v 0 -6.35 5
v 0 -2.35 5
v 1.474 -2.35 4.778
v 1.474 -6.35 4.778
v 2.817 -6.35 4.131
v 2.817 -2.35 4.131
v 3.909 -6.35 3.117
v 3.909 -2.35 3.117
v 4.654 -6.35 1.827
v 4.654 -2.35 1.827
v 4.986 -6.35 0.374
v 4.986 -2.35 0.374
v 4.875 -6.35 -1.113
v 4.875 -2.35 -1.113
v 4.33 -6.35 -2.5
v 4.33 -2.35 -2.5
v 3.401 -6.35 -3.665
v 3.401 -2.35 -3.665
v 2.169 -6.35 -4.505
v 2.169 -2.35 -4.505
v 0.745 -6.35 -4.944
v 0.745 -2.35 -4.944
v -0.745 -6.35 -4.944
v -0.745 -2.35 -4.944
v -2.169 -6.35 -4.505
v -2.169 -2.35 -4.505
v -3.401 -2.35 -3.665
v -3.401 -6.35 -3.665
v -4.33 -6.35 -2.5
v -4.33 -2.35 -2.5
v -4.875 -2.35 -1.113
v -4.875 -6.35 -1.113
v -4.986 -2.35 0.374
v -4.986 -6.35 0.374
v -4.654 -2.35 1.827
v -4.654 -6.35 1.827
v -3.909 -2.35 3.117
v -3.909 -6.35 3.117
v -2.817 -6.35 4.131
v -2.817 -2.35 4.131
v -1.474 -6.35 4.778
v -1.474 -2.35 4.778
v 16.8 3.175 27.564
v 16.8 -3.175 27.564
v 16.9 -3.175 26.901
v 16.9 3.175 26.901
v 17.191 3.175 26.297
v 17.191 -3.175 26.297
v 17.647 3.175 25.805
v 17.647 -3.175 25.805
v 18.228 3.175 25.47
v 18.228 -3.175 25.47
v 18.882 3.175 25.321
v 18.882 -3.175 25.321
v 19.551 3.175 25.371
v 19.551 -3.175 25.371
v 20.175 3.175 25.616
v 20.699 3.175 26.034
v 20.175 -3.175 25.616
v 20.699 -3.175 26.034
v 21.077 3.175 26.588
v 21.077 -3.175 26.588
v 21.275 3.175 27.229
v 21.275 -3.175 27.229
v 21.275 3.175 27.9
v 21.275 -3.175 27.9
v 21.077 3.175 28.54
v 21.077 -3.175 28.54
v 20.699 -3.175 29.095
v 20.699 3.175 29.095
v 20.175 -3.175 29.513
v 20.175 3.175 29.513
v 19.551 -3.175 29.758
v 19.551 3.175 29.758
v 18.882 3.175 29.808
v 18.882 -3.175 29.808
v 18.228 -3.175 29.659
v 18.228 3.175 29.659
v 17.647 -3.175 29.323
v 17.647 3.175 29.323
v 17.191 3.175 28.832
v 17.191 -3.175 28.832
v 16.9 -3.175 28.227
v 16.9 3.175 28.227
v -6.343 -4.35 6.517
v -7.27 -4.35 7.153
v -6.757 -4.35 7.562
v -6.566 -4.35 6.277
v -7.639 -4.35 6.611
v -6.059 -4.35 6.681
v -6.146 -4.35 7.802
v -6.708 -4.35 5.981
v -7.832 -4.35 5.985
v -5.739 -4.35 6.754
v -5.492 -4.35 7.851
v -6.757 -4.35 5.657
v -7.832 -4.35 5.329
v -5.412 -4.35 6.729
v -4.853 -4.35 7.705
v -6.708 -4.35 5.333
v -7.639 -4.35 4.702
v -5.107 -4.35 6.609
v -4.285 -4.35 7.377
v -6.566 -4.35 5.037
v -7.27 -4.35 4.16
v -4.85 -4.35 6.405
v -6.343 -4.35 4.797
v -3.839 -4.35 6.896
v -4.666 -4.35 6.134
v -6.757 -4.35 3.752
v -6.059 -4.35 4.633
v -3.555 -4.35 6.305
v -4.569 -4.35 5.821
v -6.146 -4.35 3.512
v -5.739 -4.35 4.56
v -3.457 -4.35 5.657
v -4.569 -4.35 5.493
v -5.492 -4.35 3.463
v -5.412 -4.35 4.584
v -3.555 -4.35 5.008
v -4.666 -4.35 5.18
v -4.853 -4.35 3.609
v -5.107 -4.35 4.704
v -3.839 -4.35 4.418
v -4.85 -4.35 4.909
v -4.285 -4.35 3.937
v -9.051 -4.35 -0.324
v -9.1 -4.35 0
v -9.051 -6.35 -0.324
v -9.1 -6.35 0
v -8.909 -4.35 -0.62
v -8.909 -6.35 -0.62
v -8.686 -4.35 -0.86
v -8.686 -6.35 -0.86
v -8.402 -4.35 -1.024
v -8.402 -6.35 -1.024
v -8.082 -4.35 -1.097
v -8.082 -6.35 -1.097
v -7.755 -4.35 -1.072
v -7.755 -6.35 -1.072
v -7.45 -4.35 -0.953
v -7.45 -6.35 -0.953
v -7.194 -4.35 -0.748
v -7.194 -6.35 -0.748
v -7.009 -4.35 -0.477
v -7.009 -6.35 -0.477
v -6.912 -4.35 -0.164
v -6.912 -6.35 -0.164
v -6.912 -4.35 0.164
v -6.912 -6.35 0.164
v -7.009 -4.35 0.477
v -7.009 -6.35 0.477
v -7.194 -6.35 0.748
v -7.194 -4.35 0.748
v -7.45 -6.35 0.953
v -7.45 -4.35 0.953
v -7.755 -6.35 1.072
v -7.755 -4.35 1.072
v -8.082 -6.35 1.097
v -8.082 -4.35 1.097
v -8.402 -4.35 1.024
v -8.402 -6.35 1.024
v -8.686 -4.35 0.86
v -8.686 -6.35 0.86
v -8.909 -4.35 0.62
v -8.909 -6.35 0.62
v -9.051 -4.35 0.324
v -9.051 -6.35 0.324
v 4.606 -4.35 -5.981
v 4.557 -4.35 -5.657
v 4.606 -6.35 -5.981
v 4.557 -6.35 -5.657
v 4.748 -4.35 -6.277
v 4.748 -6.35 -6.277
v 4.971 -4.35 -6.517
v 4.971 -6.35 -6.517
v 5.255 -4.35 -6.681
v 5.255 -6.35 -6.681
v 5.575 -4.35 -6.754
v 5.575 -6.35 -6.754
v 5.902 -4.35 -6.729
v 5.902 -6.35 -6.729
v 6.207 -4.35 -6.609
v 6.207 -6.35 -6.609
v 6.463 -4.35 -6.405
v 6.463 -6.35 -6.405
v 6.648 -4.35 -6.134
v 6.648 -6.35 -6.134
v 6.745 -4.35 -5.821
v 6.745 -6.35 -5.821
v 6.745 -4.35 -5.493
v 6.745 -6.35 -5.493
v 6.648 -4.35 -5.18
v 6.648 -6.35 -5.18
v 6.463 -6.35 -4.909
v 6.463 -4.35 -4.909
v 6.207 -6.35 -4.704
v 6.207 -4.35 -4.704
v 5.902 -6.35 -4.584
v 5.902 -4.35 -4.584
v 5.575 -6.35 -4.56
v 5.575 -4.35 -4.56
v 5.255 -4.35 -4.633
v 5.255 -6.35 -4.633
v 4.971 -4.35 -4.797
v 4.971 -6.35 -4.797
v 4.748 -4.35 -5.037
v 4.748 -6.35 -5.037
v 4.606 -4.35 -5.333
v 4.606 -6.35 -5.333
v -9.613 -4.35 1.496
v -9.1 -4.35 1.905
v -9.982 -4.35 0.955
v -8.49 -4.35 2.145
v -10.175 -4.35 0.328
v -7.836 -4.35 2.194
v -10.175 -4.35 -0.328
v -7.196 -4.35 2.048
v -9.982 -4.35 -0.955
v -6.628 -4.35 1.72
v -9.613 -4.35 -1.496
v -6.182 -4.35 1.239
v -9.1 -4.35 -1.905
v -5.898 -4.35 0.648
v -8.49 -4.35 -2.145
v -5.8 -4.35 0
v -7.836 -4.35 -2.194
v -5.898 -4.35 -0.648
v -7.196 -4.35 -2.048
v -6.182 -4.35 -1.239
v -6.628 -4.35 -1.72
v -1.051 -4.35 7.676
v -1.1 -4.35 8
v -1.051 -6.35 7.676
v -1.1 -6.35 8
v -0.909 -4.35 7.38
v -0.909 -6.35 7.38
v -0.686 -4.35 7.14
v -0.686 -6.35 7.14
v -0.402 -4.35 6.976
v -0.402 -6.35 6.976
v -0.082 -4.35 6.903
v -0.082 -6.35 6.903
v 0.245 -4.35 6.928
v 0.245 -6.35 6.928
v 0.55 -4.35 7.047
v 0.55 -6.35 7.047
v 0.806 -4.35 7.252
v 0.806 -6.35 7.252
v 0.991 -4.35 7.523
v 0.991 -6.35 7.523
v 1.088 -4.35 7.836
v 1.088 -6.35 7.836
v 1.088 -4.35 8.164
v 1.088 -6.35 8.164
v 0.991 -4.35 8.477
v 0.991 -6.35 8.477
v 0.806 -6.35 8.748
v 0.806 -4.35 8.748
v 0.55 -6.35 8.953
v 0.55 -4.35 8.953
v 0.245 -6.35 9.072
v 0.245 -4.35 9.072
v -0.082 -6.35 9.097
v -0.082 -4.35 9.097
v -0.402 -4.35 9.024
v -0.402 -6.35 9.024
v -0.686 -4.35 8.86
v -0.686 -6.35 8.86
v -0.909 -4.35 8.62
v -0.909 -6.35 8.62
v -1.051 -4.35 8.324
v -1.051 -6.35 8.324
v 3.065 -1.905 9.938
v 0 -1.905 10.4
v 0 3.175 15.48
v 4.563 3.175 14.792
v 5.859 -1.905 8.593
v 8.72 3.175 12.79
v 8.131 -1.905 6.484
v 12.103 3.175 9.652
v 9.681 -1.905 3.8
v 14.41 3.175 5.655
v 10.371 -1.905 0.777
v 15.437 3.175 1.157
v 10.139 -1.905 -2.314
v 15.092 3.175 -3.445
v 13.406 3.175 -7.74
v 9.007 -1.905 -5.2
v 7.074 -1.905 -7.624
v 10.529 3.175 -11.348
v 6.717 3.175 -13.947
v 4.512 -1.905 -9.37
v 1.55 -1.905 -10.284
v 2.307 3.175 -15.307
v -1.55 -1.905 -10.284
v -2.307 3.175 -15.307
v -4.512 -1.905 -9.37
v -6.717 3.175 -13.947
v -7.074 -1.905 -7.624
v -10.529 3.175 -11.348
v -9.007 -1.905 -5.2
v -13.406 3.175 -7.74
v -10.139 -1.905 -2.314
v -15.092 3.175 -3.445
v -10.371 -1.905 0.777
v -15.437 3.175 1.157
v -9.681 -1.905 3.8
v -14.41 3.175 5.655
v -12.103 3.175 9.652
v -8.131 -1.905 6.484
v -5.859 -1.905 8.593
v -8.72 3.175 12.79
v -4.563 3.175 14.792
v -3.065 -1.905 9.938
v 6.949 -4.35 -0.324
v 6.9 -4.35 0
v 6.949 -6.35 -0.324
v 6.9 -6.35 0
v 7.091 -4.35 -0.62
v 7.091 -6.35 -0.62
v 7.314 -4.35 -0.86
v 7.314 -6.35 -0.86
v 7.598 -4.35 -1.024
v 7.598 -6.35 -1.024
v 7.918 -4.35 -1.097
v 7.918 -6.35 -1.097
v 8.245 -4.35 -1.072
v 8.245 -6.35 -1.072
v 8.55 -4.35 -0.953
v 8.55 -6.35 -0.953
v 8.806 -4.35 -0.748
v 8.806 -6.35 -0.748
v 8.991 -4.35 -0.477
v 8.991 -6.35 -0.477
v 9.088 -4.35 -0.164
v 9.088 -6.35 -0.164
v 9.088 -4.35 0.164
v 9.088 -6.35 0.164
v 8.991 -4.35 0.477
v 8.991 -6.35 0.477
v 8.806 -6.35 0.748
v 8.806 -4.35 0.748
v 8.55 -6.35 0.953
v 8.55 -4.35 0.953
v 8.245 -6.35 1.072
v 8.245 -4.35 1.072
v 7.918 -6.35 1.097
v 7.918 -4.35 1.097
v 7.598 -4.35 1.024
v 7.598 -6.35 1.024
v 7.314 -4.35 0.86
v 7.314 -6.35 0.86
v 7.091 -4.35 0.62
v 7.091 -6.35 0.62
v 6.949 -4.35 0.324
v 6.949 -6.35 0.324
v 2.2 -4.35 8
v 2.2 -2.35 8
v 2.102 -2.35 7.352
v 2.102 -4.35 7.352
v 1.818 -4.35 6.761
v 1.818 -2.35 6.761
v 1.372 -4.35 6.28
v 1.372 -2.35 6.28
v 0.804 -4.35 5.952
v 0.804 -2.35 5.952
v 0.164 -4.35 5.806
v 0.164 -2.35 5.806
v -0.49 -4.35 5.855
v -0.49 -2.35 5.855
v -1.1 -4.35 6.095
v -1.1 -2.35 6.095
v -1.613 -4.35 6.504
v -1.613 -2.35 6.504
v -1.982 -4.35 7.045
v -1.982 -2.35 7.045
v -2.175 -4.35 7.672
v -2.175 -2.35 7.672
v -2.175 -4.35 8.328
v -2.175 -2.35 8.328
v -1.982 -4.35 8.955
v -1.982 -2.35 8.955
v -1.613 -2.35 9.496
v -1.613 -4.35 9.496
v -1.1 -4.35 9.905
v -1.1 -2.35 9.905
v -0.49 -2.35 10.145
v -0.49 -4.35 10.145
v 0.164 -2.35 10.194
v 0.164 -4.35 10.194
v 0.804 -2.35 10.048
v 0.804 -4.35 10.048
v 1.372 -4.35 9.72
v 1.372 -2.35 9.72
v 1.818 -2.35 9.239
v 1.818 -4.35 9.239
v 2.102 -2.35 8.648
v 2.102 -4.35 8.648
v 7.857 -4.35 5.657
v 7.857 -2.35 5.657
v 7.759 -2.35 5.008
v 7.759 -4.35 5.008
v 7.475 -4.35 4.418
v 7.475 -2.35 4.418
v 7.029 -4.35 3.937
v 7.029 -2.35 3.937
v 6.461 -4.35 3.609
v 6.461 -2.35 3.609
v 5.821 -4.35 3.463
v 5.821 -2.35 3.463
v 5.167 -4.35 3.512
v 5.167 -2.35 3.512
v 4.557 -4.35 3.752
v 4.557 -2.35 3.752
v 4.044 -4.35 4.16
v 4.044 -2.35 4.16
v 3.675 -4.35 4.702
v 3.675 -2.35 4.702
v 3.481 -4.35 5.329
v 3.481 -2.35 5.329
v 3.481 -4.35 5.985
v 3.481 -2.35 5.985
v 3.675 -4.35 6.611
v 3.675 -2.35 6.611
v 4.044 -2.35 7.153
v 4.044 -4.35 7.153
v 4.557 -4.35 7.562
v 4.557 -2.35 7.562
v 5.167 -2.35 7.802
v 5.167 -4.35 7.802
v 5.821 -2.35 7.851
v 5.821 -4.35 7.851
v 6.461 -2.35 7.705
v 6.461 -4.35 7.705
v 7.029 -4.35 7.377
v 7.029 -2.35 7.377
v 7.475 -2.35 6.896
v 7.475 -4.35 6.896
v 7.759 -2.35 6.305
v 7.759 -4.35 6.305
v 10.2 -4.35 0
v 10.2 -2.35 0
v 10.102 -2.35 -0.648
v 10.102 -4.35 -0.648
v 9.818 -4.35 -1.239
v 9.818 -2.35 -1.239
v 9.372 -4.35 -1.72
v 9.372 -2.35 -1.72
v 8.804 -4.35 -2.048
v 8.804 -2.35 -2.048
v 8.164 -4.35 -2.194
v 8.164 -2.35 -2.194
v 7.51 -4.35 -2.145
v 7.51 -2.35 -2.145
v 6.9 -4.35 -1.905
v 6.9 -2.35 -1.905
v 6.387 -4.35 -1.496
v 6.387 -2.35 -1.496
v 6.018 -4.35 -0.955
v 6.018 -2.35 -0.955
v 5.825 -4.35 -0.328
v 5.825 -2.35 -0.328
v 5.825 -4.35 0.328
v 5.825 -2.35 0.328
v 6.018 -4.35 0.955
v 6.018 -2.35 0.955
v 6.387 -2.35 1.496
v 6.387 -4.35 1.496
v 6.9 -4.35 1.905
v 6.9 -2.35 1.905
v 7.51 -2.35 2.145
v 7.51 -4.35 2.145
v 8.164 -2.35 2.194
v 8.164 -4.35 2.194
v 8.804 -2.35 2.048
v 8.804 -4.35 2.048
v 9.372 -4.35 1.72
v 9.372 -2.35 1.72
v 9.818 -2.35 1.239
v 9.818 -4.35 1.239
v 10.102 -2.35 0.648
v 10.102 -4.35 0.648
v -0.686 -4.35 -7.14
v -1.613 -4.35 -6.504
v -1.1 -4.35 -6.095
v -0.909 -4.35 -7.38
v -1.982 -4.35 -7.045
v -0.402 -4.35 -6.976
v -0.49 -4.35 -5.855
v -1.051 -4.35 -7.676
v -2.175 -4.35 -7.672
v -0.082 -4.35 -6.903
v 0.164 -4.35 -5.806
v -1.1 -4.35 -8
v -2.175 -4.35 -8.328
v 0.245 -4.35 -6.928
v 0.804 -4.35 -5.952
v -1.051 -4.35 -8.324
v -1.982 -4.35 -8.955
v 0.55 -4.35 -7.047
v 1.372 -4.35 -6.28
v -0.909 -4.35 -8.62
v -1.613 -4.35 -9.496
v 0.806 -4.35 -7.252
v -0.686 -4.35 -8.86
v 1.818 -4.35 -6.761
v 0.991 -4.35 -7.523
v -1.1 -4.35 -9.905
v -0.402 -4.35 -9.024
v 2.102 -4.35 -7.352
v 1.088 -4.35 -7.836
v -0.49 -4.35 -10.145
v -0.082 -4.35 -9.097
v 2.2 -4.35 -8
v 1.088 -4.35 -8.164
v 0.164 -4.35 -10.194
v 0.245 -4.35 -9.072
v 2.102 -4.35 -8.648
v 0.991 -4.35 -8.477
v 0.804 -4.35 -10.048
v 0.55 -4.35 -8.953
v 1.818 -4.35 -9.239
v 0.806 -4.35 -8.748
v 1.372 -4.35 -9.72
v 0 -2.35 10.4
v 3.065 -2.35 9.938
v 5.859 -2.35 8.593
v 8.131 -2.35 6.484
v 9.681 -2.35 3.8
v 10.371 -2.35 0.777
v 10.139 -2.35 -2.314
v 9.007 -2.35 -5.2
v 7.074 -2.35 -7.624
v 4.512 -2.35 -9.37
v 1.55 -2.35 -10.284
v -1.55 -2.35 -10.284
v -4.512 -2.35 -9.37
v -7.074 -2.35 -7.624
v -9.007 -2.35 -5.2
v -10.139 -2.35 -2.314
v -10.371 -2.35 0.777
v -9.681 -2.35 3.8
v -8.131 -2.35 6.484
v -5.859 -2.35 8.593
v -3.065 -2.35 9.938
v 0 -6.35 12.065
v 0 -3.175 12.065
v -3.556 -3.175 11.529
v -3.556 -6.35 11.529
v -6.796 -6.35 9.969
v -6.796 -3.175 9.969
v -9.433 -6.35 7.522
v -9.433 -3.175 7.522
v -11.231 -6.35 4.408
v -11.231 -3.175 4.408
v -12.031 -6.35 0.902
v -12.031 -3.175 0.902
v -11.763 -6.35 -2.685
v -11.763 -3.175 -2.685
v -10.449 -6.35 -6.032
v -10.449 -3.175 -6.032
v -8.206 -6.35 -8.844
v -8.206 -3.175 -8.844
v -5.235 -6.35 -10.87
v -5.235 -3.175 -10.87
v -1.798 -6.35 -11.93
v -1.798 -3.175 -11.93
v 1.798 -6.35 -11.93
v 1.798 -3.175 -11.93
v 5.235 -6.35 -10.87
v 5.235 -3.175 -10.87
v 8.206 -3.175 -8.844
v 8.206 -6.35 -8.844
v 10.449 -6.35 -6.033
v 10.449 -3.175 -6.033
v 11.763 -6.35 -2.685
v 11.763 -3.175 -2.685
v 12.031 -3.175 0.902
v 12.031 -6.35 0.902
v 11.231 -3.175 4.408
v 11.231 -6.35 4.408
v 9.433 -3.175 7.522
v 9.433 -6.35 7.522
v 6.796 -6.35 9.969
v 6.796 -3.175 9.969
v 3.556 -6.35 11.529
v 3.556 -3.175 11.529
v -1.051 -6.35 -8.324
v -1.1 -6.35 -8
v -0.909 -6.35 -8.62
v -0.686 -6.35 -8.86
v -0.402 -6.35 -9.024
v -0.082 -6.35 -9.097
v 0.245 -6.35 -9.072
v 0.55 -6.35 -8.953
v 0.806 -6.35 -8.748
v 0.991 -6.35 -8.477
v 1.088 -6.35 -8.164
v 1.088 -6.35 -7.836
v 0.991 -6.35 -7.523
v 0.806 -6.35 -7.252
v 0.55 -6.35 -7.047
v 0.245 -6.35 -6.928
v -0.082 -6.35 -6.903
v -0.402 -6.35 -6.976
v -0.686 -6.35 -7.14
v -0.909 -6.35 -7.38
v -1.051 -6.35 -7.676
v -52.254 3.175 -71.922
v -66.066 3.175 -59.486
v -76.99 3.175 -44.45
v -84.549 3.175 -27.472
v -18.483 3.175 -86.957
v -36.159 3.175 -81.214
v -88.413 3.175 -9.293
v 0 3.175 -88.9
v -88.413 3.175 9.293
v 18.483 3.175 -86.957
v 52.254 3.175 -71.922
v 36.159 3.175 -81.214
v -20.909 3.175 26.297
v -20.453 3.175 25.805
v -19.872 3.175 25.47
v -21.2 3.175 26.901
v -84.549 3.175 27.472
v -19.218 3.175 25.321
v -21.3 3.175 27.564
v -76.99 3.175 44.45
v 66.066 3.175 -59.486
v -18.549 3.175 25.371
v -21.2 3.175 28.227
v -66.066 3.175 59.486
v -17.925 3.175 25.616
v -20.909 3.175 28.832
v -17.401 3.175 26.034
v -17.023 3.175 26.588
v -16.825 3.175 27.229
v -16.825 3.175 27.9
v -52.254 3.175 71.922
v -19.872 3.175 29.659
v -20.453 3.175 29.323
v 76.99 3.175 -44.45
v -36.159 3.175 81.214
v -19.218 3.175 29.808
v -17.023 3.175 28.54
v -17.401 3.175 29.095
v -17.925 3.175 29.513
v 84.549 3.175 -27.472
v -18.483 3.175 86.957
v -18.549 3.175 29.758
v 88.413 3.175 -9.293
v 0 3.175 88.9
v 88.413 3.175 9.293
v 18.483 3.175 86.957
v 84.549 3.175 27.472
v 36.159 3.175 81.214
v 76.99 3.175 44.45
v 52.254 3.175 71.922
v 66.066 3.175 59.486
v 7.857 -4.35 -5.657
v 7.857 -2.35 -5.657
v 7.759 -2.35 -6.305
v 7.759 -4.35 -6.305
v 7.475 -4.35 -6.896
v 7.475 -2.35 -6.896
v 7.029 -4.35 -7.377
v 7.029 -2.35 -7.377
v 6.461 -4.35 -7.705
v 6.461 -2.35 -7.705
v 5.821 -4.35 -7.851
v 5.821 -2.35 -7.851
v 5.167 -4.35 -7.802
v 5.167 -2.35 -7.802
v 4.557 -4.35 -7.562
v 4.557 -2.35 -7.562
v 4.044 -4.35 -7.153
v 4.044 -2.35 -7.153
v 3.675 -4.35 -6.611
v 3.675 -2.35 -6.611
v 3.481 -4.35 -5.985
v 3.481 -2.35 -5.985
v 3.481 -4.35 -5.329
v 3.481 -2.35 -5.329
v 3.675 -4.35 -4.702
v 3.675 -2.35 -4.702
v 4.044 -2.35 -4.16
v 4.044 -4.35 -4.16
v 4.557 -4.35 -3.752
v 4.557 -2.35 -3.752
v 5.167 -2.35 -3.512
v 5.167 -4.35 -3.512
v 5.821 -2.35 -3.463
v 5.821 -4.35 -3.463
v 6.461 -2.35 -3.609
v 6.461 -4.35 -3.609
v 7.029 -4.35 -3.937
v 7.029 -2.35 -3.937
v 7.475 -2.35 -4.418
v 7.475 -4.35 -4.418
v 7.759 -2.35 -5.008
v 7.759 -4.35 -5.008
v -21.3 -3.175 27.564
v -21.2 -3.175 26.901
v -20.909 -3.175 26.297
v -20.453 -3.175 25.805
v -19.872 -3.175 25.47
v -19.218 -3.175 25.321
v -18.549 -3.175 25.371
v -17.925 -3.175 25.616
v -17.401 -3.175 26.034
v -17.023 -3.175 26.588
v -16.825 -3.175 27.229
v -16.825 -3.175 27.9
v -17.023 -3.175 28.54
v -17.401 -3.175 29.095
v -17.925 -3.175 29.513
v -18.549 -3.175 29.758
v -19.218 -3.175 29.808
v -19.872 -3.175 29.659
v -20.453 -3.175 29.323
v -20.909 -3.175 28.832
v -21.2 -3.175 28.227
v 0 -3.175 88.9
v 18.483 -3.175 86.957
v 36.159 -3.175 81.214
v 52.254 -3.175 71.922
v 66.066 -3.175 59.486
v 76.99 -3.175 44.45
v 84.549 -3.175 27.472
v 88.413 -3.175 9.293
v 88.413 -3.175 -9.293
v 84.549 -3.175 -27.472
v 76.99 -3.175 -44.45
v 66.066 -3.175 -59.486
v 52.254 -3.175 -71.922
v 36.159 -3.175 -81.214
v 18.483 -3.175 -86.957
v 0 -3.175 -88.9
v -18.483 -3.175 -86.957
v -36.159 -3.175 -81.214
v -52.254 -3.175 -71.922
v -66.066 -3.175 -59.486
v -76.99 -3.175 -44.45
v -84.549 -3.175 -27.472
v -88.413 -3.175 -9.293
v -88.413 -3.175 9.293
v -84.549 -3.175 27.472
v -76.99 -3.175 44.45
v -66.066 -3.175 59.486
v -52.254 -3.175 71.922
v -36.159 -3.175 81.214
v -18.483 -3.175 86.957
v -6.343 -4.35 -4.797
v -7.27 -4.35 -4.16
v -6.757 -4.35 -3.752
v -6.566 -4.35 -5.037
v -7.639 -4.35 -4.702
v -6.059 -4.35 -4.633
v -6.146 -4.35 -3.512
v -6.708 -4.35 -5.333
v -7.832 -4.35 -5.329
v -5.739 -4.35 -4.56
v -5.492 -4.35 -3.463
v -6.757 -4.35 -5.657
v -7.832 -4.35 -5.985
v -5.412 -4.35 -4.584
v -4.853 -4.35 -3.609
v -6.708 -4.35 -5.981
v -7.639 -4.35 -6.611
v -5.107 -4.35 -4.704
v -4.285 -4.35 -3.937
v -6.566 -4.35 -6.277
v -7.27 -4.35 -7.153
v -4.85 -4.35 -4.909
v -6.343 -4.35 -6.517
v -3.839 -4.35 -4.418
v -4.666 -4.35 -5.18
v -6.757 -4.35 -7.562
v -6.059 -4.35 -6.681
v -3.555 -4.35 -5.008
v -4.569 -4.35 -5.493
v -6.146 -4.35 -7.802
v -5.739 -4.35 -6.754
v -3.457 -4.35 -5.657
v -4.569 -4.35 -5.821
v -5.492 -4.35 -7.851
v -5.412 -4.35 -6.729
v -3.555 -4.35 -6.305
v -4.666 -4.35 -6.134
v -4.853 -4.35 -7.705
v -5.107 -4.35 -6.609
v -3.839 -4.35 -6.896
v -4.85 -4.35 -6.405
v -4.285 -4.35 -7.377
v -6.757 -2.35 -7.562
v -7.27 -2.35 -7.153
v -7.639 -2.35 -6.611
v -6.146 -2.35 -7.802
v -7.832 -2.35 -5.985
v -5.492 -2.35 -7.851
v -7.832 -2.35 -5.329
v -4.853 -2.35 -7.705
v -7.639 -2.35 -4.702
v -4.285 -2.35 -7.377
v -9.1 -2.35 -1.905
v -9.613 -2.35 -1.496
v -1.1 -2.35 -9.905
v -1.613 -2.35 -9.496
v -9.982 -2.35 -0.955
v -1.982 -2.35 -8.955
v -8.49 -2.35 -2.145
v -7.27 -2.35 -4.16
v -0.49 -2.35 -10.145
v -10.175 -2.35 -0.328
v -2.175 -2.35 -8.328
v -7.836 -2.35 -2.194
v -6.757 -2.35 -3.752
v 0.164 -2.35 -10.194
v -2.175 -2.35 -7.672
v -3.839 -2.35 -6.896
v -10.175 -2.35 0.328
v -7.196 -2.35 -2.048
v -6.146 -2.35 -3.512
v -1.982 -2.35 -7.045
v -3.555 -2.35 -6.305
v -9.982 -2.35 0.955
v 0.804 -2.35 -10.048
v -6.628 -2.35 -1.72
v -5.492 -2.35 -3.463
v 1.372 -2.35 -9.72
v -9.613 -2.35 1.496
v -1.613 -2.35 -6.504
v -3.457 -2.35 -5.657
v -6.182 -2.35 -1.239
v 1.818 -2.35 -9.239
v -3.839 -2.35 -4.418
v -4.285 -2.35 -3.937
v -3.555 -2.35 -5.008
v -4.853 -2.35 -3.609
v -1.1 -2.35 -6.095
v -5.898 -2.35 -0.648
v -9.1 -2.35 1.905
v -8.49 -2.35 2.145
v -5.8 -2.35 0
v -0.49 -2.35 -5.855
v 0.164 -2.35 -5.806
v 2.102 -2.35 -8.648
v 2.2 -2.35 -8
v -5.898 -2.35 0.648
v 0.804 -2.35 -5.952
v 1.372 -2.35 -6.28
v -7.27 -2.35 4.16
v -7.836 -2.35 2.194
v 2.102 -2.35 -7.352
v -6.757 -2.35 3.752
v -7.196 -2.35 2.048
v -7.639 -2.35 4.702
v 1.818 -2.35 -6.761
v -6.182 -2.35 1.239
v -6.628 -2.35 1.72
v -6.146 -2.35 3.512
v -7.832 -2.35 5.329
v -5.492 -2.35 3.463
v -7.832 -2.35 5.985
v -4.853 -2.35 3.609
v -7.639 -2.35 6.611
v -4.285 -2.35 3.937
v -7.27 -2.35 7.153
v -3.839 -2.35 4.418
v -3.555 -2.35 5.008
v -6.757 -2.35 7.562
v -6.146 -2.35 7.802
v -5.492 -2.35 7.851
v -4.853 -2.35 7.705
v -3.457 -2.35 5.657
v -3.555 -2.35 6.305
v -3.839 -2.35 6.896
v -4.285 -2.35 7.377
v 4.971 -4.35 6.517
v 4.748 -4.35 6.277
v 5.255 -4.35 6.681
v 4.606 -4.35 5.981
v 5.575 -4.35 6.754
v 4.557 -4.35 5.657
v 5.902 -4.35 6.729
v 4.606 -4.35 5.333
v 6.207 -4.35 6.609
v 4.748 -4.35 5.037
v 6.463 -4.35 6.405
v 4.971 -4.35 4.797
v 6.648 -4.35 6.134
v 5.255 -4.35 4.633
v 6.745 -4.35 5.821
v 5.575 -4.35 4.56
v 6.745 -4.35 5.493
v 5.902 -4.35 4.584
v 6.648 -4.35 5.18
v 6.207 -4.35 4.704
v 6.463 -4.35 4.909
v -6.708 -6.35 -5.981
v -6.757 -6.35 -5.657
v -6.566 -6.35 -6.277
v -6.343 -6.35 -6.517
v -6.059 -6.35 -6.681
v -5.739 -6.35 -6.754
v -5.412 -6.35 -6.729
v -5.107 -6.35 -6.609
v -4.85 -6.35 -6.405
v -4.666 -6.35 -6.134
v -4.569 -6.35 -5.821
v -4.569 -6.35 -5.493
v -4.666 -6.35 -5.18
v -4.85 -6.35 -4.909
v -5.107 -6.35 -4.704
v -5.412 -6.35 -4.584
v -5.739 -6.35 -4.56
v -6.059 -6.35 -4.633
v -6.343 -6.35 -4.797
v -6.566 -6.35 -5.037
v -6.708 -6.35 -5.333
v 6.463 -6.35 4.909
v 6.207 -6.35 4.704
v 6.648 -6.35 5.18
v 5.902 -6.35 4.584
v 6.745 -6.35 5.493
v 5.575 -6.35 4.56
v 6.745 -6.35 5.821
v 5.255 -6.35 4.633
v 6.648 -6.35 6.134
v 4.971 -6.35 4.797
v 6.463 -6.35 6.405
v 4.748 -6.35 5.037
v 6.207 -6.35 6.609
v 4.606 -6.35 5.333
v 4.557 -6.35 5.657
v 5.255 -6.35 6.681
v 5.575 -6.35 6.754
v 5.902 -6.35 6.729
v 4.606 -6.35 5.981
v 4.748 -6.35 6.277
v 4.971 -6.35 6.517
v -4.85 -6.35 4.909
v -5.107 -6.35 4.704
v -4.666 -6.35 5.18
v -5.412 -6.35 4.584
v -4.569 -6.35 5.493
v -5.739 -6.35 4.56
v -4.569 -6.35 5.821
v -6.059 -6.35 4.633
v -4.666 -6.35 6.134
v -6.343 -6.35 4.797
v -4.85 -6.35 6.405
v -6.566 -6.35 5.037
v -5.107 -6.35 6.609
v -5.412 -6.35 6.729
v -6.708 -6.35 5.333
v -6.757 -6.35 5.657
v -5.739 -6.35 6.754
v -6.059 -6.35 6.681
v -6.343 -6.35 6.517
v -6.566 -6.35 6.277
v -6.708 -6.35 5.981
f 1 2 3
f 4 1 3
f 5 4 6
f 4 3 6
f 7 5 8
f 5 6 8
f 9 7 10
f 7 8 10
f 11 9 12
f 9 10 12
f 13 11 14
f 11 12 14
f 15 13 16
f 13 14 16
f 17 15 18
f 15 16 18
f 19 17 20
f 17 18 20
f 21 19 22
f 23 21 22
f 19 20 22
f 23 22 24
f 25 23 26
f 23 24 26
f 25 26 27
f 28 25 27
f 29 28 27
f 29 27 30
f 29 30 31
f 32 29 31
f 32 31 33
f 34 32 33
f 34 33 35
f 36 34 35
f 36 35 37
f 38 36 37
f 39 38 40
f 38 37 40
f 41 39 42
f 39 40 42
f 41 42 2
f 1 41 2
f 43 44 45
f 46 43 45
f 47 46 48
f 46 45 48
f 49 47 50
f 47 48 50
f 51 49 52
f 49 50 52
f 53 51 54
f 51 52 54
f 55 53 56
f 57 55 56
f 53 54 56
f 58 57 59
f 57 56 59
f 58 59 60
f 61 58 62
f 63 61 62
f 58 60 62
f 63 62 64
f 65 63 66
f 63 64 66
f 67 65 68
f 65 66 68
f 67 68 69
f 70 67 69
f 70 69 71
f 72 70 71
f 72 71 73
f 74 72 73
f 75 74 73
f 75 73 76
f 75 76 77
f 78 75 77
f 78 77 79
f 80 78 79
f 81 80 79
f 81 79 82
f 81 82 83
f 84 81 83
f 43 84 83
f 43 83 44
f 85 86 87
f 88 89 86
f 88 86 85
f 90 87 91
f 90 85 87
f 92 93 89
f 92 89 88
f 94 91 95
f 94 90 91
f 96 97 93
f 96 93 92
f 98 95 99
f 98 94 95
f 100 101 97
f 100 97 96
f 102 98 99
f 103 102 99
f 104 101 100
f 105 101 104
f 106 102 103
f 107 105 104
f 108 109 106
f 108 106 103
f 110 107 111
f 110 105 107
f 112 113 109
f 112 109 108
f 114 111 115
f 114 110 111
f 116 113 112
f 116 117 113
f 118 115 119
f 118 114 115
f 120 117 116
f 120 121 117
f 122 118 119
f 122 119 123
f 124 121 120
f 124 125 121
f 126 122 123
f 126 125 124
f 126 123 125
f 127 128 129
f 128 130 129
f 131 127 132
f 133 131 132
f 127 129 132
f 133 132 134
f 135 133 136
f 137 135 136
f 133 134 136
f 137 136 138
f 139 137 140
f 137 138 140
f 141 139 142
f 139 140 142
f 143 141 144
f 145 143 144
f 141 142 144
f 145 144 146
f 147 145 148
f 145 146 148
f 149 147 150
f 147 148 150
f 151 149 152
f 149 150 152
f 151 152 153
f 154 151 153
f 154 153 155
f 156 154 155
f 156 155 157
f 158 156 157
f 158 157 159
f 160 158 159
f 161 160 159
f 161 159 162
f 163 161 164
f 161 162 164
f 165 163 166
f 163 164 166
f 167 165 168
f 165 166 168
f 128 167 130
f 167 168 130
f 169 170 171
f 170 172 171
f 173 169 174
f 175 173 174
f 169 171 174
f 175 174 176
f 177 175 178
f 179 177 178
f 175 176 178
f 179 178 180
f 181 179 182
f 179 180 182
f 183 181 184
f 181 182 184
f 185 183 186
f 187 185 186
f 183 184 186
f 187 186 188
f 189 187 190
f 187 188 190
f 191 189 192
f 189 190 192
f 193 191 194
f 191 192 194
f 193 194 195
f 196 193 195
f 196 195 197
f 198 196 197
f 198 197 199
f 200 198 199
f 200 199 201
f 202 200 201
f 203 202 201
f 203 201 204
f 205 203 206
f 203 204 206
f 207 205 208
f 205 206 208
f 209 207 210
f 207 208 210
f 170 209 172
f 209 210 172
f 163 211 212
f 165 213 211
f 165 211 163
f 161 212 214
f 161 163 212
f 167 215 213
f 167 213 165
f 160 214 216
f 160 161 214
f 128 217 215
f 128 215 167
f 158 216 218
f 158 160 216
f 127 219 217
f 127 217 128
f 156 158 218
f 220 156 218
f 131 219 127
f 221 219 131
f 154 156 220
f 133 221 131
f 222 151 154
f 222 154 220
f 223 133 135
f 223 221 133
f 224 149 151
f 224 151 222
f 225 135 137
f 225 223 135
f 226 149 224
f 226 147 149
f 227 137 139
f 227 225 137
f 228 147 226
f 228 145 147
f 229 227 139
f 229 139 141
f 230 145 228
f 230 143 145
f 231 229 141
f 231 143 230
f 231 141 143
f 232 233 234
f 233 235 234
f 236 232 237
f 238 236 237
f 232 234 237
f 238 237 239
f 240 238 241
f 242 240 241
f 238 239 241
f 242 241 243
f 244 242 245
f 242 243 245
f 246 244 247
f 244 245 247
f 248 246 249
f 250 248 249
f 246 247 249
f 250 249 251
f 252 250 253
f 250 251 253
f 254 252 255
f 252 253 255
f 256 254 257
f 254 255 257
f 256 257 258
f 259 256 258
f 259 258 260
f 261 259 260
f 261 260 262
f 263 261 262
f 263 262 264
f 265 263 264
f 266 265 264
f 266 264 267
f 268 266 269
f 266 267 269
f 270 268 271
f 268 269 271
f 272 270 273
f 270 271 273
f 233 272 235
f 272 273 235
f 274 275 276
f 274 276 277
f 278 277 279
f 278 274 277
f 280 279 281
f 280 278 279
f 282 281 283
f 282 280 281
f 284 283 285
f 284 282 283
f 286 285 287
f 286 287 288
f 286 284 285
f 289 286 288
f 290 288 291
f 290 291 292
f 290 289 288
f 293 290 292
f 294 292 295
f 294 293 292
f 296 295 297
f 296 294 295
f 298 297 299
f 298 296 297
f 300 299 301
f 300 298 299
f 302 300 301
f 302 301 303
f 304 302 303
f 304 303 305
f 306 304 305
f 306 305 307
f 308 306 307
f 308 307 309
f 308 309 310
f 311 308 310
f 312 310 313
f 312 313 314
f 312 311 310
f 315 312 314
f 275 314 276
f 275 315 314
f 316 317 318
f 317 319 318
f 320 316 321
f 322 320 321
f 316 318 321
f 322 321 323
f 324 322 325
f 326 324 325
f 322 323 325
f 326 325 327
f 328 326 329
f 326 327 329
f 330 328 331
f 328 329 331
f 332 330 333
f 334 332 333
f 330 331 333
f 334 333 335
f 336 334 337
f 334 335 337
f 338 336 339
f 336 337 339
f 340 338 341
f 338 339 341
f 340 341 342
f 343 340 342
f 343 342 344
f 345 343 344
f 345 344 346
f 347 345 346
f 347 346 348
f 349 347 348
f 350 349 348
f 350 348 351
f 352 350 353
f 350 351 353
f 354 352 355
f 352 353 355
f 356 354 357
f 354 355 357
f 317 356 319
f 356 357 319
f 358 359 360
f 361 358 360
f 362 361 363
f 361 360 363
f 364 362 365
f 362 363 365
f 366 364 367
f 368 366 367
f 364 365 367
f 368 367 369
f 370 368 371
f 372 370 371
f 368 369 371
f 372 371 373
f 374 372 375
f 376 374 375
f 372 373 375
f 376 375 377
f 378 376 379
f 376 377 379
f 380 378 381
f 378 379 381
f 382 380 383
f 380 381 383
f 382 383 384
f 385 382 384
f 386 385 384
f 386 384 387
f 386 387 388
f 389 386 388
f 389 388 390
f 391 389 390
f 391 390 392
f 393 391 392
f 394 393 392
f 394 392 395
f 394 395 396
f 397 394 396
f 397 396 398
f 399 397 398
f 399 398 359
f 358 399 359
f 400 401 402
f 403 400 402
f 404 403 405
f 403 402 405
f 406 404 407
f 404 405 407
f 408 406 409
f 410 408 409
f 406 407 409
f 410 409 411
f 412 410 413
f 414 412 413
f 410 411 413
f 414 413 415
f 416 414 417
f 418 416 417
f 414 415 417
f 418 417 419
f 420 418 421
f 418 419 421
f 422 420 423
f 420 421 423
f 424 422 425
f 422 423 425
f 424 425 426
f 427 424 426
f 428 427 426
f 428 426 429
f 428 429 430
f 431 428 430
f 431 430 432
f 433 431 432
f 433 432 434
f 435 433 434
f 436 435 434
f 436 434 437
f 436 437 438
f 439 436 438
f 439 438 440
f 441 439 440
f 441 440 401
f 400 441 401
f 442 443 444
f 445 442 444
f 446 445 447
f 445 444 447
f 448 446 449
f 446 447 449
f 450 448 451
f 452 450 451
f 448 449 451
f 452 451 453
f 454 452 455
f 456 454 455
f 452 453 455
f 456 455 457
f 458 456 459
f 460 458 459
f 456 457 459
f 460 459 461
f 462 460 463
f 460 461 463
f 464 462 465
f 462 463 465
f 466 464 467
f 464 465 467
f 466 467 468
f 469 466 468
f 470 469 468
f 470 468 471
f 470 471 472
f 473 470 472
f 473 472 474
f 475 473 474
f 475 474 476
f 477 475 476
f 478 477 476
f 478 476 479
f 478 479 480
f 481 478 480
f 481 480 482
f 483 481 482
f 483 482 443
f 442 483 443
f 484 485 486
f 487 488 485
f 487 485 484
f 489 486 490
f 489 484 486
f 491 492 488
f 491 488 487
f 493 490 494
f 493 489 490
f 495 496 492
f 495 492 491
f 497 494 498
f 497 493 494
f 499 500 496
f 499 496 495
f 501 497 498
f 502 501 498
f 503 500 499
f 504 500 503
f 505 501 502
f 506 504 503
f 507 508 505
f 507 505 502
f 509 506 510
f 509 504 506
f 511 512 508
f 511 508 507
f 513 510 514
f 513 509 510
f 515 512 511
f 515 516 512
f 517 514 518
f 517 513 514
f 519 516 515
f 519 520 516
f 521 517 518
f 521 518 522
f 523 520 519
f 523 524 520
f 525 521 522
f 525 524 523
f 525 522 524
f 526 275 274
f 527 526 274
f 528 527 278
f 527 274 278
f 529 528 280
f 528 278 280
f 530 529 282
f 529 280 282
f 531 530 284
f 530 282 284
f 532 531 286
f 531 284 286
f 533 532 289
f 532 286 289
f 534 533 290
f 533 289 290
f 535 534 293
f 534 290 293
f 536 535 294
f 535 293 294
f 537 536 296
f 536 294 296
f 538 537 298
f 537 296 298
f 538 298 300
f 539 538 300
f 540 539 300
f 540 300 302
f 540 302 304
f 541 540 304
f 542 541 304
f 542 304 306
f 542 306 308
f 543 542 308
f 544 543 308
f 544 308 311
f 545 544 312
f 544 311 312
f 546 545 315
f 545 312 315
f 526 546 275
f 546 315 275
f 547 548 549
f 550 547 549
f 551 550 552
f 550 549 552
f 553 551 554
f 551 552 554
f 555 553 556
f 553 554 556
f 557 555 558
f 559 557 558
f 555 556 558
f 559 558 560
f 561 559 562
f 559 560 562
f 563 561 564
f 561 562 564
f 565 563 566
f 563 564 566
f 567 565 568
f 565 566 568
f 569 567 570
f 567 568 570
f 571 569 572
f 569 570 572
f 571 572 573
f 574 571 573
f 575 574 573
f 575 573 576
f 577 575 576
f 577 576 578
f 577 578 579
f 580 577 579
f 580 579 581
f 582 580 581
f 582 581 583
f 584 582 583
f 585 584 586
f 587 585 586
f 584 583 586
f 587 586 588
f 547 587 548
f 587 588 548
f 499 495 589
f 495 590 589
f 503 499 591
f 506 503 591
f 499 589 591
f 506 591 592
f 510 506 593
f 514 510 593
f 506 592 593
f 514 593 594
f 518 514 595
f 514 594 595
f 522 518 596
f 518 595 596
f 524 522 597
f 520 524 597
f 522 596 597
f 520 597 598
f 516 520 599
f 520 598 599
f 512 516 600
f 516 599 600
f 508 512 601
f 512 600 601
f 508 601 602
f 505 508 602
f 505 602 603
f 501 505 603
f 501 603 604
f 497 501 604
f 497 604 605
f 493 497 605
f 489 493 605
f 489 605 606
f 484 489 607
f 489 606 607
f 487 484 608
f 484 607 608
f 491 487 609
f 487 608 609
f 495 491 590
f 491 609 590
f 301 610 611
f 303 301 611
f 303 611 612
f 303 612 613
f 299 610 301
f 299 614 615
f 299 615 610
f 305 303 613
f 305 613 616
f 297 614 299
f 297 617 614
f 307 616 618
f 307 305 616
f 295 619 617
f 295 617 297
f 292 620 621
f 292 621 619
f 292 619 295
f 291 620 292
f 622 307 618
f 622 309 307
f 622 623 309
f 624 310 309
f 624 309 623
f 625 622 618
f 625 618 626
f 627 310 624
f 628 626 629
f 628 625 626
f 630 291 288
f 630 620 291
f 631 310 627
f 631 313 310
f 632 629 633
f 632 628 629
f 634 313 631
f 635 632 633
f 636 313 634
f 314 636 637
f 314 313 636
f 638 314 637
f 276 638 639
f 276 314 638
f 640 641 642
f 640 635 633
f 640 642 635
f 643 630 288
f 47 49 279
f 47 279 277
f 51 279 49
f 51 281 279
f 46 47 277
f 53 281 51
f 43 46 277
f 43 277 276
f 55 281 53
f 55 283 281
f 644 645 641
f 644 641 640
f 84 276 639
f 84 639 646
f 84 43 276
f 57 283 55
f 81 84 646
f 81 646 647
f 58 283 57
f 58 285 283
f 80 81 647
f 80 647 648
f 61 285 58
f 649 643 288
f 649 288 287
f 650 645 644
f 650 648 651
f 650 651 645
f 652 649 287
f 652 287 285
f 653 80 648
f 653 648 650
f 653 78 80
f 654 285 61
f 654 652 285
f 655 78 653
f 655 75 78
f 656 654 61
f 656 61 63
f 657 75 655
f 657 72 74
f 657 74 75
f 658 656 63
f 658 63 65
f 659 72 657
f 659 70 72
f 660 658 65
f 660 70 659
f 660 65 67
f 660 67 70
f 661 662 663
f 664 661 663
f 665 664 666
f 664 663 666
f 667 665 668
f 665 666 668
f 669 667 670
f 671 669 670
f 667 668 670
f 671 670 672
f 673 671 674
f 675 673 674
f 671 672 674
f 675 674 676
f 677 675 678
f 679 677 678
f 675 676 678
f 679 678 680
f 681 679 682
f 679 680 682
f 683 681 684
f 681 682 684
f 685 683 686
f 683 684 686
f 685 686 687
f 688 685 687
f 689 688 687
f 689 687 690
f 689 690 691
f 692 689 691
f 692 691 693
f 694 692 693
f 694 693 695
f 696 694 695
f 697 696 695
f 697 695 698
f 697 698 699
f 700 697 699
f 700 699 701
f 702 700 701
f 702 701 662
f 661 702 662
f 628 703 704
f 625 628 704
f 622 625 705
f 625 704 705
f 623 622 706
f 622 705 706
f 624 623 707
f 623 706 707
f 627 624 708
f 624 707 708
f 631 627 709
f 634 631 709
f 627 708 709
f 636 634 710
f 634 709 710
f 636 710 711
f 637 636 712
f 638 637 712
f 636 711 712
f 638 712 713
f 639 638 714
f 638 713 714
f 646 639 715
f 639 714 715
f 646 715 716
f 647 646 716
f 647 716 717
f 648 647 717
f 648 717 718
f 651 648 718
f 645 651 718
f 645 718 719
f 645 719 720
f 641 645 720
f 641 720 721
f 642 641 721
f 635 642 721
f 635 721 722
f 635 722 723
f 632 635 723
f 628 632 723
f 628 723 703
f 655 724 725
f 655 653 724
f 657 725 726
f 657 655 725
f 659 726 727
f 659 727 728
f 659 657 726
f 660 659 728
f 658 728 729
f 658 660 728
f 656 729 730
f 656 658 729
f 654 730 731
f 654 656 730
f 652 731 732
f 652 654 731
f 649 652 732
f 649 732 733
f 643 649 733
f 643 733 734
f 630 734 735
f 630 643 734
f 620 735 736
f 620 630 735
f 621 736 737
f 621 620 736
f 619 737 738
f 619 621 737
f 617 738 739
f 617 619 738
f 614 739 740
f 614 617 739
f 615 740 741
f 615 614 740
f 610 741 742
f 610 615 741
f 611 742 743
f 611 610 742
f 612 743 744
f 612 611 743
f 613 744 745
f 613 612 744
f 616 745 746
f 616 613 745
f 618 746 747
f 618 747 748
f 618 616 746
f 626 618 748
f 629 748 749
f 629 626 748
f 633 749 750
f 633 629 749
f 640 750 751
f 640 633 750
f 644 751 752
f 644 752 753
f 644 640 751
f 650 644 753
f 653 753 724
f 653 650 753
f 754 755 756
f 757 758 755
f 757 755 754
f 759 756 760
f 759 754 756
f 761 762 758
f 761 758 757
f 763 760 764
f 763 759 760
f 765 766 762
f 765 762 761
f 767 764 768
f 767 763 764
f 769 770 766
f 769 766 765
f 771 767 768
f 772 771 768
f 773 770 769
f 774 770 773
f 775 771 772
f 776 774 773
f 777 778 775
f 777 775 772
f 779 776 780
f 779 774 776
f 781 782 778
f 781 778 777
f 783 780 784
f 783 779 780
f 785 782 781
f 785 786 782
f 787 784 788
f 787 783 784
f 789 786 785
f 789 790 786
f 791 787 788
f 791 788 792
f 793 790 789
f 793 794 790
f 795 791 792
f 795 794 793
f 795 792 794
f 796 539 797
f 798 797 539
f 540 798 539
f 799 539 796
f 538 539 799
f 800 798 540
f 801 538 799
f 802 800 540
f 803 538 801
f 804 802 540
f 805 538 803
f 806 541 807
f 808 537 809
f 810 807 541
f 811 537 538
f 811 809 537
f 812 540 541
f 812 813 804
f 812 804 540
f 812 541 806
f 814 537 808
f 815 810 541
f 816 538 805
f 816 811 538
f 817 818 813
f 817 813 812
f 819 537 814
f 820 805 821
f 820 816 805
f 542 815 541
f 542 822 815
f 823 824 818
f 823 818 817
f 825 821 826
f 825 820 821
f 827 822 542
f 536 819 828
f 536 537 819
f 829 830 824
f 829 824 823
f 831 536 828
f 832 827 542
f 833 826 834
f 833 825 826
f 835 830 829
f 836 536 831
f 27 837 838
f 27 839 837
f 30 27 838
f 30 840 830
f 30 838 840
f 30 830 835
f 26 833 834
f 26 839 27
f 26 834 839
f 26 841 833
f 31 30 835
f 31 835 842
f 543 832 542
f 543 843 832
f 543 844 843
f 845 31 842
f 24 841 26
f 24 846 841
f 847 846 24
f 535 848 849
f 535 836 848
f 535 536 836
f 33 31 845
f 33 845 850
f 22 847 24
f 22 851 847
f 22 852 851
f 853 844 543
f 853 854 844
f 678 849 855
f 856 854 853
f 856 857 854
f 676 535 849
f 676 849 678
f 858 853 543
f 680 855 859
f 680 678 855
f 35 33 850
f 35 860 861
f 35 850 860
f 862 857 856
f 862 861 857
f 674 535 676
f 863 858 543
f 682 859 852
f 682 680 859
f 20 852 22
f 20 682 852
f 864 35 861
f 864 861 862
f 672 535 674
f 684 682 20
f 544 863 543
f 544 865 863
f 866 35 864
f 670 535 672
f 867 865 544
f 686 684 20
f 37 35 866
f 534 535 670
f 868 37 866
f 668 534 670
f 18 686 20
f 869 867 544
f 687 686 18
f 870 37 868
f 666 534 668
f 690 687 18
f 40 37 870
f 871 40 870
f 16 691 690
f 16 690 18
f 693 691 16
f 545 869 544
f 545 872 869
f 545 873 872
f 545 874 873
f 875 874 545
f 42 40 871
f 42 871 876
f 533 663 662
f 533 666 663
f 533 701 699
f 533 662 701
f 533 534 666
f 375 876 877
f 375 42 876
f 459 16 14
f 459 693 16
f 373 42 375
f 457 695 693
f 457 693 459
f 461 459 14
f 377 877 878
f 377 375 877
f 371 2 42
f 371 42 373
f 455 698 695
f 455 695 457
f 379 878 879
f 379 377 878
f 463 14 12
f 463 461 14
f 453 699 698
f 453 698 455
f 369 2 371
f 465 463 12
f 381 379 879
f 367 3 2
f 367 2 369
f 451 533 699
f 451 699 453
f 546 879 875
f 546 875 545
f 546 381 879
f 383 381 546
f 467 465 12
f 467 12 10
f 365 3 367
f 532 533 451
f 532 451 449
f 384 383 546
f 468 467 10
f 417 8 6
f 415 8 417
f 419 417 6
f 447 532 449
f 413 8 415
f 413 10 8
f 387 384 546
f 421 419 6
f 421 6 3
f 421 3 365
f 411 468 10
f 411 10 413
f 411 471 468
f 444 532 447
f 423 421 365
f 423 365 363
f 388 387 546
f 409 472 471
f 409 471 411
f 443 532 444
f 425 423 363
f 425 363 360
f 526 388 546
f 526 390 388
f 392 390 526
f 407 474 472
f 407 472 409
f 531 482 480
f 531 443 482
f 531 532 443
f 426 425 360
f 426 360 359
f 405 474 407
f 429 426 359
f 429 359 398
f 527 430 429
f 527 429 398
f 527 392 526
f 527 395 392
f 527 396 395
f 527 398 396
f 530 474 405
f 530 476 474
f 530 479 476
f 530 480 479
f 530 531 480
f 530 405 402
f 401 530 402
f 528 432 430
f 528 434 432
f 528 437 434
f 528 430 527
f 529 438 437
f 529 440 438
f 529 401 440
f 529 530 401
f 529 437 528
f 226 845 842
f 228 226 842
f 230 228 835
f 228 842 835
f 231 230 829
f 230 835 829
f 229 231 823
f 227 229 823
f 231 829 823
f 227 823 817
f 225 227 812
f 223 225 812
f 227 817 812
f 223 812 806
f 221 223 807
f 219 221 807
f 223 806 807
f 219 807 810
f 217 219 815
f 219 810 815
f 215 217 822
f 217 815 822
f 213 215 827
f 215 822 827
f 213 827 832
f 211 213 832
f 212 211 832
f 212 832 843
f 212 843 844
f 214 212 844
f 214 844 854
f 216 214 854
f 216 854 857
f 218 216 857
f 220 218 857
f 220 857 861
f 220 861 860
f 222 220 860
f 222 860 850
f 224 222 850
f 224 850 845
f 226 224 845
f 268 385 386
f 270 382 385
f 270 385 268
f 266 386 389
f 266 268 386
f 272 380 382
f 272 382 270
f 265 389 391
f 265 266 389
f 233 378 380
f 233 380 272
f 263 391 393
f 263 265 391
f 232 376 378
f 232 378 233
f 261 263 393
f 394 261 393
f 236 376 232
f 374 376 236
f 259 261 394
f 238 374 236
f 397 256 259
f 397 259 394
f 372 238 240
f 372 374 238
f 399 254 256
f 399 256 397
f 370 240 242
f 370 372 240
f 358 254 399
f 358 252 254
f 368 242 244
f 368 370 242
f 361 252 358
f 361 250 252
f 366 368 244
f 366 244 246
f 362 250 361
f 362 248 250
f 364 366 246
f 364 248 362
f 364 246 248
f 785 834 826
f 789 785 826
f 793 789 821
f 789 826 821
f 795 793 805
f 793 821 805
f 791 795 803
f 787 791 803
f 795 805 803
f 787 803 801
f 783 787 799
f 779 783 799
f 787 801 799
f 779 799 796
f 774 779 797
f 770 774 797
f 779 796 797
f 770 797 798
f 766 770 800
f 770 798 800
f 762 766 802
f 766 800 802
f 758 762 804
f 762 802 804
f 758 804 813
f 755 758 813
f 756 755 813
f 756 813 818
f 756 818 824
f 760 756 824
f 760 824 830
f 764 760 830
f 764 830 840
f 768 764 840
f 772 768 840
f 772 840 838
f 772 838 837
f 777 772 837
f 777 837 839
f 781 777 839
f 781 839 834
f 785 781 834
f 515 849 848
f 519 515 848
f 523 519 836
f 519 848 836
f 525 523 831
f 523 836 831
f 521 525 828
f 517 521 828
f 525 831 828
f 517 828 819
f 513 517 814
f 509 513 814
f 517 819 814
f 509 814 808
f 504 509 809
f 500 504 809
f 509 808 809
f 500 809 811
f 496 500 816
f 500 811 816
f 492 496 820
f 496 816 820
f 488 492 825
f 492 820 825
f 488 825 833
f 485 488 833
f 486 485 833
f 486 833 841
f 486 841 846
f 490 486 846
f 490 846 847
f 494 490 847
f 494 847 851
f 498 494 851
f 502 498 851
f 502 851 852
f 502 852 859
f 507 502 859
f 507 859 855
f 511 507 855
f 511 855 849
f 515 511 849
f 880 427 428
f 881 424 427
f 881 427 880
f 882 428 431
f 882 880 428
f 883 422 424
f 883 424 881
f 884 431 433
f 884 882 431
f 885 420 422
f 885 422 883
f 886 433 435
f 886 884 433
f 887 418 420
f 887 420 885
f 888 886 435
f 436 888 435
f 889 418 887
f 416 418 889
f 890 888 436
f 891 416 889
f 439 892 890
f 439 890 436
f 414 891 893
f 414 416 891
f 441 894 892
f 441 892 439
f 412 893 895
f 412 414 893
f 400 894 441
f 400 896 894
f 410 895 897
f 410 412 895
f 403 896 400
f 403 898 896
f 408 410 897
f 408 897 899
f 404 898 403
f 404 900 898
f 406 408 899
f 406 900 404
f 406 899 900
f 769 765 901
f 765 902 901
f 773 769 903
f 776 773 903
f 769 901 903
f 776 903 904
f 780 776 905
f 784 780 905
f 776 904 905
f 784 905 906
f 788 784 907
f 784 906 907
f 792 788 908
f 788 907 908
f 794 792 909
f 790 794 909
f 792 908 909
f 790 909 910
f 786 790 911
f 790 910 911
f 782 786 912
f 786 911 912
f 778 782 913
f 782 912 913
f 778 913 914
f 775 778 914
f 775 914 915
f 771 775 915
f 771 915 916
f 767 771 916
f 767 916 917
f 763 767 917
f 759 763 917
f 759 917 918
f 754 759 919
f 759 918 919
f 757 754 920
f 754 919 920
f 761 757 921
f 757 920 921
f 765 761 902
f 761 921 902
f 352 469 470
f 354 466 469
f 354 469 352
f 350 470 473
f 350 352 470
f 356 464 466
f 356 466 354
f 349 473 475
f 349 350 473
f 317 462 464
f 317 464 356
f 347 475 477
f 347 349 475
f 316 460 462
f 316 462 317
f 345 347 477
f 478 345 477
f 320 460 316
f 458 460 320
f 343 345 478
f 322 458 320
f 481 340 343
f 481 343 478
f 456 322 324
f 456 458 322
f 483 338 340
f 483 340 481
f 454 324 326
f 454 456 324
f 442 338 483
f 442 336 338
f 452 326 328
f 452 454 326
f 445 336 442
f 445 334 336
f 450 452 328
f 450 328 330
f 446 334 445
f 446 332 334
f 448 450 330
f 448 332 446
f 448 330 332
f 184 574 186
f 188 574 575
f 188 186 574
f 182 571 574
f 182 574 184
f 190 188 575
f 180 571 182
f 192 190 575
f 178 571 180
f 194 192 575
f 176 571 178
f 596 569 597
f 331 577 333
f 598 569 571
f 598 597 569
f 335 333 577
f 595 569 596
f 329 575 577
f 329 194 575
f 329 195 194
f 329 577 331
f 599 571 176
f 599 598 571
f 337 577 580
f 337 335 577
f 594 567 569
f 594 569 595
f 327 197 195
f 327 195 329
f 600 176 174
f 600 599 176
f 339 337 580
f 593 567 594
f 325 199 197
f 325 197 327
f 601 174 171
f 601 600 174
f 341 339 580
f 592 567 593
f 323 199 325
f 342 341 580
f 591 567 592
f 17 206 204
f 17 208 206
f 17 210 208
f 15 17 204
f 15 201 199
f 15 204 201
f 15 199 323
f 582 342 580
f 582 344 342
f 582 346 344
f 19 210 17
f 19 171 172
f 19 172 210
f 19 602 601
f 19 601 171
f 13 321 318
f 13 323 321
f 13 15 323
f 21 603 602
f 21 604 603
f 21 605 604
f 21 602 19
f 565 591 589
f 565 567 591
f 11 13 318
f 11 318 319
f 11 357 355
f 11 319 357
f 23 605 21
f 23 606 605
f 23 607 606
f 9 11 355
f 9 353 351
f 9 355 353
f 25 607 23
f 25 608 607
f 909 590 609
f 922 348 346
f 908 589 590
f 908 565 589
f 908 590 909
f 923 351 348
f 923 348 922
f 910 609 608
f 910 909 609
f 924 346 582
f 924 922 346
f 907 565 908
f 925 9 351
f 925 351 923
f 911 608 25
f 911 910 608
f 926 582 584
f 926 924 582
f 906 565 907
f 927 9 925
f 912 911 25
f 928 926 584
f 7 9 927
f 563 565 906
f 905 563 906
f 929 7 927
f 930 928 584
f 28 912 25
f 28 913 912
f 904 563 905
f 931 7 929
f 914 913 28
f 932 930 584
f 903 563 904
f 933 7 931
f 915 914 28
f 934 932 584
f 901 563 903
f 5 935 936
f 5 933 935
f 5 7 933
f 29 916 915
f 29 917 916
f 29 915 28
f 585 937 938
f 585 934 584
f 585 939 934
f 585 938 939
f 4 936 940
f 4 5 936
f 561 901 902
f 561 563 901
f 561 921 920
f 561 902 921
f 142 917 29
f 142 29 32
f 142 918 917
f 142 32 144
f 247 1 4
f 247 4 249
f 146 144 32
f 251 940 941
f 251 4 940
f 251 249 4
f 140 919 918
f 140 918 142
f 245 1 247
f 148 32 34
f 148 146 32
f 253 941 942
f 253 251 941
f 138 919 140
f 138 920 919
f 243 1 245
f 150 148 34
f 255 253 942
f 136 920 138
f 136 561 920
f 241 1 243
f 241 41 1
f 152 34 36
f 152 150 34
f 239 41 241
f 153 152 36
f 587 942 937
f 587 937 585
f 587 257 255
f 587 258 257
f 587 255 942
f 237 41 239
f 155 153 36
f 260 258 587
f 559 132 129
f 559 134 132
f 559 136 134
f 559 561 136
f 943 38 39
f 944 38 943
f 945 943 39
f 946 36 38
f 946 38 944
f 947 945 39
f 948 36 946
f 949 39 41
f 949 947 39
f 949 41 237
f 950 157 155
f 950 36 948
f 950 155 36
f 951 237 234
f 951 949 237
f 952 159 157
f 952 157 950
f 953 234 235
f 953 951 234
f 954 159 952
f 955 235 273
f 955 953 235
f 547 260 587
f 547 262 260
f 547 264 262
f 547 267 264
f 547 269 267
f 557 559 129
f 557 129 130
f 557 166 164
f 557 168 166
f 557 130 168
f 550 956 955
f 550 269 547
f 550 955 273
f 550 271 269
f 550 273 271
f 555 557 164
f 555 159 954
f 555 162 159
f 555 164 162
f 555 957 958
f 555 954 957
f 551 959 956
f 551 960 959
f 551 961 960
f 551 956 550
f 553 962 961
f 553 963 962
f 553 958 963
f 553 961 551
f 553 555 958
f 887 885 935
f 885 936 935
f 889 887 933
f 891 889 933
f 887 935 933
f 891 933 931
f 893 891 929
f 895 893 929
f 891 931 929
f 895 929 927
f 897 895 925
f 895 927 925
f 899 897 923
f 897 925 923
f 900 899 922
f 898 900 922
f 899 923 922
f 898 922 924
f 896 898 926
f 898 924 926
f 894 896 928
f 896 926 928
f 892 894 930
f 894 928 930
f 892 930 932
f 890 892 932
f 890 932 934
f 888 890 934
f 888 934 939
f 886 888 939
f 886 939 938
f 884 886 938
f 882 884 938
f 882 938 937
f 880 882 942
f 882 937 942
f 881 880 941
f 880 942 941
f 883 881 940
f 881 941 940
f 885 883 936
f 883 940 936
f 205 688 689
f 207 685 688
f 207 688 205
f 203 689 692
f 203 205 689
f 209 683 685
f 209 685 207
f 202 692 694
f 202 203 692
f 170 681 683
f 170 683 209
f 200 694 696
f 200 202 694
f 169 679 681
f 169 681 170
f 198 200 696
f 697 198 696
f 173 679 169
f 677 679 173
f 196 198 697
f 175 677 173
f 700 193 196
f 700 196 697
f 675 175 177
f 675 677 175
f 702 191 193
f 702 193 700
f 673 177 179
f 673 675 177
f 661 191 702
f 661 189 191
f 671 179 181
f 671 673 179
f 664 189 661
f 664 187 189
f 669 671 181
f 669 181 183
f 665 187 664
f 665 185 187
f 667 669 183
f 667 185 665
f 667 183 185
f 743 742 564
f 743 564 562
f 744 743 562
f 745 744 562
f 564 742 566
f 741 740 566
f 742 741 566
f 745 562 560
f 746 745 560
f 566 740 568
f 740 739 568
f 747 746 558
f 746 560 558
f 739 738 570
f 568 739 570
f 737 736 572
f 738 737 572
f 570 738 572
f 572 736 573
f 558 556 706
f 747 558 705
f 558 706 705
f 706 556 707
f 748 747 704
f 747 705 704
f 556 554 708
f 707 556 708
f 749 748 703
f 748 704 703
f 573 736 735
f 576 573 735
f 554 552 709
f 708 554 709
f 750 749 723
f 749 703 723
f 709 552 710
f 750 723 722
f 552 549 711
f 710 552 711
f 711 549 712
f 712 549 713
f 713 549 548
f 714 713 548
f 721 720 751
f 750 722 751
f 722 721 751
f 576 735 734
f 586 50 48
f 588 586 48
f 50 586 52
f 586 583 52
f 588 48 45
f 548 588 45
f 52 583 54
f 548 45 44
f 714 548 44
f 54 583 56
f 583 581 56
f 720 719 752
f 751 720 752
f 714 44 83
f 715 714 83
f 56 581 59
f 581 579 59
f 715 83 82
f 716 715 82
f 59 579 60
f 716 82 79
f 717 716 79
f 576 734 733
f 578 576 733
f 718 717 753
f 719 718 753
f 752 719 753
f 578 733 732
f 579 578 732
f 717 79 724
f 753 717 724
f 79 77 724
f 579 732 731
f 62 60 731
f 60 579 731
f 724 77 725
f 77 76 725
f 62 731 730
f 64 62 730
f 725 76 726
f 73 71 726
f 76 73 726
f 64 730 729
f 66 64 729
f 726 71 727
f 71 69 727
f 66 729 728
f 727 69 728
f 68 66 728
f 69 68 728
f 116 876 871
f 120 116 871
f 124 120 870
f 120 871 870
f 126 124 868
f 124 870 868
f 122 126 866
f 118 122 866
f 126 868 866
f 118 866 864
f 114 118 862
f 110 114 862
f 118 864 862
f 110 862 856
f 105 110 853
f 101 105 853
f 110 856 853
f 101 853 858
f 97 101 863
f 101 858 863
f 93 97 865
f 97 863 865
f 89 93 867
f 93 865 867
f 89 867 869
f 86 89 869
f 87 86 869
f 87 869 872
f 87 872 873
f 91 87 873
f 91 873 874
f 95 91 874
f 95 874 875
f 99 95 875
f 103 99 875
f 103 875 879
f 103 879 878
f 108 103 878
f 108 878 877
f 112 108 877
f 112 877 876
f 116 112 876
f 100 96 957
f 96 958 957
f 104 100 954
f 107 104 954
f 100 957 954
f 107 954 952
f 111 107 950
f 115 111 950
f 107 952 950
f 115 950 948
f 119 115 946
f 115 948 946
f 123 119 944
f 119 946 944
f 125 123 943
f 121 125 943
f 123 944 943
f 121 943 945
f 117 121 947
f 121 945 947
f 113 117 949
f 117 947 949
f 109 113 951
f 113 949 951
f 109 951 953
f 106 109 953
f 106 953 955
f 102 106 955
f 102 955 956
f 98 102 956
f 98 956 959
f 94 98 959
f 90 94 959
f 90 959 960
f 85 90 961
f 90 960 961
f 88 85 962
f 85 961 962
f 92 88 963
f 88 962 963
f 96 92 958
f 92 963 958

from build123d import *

# Parameters (mm, degrees)
SKETCH1_R                      = 88.9
BOSS_EXTRUDE1_DEPTH            = 3.175
SKETCH2_R                      = 12.065
BOSS_EXTRUDE2_DEPTH            = 3.175
SKETCH5_R                      = 10.4
CUT_EXTRUDE1_DEPTH             = 5.525
SKETCH6_R                      = 5
CUT_EXTRUDE2_DEPTH             = 4
CBORE_FOR_M2_SHCS1_D           = 2.2
CBORE_FOR_M2_SHCS1_DEPTH       = 6
CBORE_FOR_M2_SHCS1_CBORE_D     = 4.4
CBORE_FOR_M2_SHCS1_CBORE_DEPTH = 2
CBORE_FOR_M2_SHCS1_TIP         = 0.660946681
M4_CLEARANCE_HOLE1_D           = 4.5
CHAMFER1_SIZE                  = 5.08


with BuildPart() as part:
    # Sketch1 → Boss-Extrude1 (new, symmetric)
    with BuildSketch(Plane(origin=(0, 0, 0), x_dir=(1, 0, 0), z_dir=(0, 1, 0))):
        with Locations(Location((0, 0, 0), (0, 0, 270))):
            Circle(SKETCH1_R)
    extrude(amount=BOSS_EXTRUDE1_DEPTH, both=True)

    # Sketch2 → Boss-Extrude2 (add)
    with BuildSketch(Plane.XZ.offset(3.175)):
        with Locations(Location((0, 0, 0), (0, 0, 90))):
            Circle(SKETCH2_R)
    extrude(amount=BOSS_EXTRUDE2_DEPTH)

    # Sketch5 → Cut-Extrude1 (cut)
    with BuildSketch(Plane(origin=(0, 3.175, 0), x_dir=(1, 0, 0), z_dir=(0, 1, 0))):
        with Locations(Location((0, 0, 0), (0, 0, 270))):
            Circle(SKETCH5_R)
    extrude(amount=-CUT_EXTRUDE1_DEPTH, mode=Mode.SUBTRACT)

    # Sketch6 → Cut-Extrude2 (cut)
    with BuildSketch(Plane(origin=(0, -2.35, 0), x_dir=(1, 0, 0), z_dir=(0, 1, 0))):
        with Locations(Location((0, 0, 0), (0, 0, 270))):
            Circle(SKETCH6_R)
    extrude(amount=-CUT_EXTRUDE2_DEPTH, mode=Mode.SUBTRACT)

    # CBORE for M2 SHCS1
    with Locations(Plane(origin=(0, -2.35, 0), x_dir=(1, 0, 0), z_dir=(0, 1, 0))):
        with Locations((-5.65685425, 5.65685425), (0, 8), (5.65685425, 5.65685425), (8, 0), (5.65685425, -5.65685425), (0, -8), (-5.65685425, -5.65685425), (-8, 0)):
            CounterBoreHole(CBORE_FOR_M2_SHCS1_D / 2, CBORE_FOR_M2_SHCS1_CBORE_D / 2, CBORE_FOR_M2_SHCS1_CBORE_DEPTH, depth=CBORE_FOR_M2_SHCS1_DEPTH)
            with Locations((0, 0, -(CBORE_FOR_M2_SHCS1_DEPTH + CBORE_FOR_M2_SHCS1_TIP / 2))):  # 118° drill point
                Cone(0, CBORE_FOR_M2_SHCS1_D / 2, CBORE_FOR_M2_SHCS1_TIP, mode=Mode.SUBTRACT)

    # M4 Clearance Hole1 (through all)
    with Locations(Plane(origin=(0, 3.175, 0), x_dir=(1, 0, 0), z_dir=(0, 1, 0))):
        with Locations((19.05, -27.564242343), (-19.05, -27.564242343)):
            Hole(M4_CLEARANCE_HOLE1_D / 2)

    # Chamfer1
    chamfer1_edges = [part.edges().sort_by_distance(p)[0] for p in [
        (0, 3.175, -10.4),
    ]]
    chamfer(chamfer1_edges, length=CHAMFER1_SIZE)


solid = part.part
